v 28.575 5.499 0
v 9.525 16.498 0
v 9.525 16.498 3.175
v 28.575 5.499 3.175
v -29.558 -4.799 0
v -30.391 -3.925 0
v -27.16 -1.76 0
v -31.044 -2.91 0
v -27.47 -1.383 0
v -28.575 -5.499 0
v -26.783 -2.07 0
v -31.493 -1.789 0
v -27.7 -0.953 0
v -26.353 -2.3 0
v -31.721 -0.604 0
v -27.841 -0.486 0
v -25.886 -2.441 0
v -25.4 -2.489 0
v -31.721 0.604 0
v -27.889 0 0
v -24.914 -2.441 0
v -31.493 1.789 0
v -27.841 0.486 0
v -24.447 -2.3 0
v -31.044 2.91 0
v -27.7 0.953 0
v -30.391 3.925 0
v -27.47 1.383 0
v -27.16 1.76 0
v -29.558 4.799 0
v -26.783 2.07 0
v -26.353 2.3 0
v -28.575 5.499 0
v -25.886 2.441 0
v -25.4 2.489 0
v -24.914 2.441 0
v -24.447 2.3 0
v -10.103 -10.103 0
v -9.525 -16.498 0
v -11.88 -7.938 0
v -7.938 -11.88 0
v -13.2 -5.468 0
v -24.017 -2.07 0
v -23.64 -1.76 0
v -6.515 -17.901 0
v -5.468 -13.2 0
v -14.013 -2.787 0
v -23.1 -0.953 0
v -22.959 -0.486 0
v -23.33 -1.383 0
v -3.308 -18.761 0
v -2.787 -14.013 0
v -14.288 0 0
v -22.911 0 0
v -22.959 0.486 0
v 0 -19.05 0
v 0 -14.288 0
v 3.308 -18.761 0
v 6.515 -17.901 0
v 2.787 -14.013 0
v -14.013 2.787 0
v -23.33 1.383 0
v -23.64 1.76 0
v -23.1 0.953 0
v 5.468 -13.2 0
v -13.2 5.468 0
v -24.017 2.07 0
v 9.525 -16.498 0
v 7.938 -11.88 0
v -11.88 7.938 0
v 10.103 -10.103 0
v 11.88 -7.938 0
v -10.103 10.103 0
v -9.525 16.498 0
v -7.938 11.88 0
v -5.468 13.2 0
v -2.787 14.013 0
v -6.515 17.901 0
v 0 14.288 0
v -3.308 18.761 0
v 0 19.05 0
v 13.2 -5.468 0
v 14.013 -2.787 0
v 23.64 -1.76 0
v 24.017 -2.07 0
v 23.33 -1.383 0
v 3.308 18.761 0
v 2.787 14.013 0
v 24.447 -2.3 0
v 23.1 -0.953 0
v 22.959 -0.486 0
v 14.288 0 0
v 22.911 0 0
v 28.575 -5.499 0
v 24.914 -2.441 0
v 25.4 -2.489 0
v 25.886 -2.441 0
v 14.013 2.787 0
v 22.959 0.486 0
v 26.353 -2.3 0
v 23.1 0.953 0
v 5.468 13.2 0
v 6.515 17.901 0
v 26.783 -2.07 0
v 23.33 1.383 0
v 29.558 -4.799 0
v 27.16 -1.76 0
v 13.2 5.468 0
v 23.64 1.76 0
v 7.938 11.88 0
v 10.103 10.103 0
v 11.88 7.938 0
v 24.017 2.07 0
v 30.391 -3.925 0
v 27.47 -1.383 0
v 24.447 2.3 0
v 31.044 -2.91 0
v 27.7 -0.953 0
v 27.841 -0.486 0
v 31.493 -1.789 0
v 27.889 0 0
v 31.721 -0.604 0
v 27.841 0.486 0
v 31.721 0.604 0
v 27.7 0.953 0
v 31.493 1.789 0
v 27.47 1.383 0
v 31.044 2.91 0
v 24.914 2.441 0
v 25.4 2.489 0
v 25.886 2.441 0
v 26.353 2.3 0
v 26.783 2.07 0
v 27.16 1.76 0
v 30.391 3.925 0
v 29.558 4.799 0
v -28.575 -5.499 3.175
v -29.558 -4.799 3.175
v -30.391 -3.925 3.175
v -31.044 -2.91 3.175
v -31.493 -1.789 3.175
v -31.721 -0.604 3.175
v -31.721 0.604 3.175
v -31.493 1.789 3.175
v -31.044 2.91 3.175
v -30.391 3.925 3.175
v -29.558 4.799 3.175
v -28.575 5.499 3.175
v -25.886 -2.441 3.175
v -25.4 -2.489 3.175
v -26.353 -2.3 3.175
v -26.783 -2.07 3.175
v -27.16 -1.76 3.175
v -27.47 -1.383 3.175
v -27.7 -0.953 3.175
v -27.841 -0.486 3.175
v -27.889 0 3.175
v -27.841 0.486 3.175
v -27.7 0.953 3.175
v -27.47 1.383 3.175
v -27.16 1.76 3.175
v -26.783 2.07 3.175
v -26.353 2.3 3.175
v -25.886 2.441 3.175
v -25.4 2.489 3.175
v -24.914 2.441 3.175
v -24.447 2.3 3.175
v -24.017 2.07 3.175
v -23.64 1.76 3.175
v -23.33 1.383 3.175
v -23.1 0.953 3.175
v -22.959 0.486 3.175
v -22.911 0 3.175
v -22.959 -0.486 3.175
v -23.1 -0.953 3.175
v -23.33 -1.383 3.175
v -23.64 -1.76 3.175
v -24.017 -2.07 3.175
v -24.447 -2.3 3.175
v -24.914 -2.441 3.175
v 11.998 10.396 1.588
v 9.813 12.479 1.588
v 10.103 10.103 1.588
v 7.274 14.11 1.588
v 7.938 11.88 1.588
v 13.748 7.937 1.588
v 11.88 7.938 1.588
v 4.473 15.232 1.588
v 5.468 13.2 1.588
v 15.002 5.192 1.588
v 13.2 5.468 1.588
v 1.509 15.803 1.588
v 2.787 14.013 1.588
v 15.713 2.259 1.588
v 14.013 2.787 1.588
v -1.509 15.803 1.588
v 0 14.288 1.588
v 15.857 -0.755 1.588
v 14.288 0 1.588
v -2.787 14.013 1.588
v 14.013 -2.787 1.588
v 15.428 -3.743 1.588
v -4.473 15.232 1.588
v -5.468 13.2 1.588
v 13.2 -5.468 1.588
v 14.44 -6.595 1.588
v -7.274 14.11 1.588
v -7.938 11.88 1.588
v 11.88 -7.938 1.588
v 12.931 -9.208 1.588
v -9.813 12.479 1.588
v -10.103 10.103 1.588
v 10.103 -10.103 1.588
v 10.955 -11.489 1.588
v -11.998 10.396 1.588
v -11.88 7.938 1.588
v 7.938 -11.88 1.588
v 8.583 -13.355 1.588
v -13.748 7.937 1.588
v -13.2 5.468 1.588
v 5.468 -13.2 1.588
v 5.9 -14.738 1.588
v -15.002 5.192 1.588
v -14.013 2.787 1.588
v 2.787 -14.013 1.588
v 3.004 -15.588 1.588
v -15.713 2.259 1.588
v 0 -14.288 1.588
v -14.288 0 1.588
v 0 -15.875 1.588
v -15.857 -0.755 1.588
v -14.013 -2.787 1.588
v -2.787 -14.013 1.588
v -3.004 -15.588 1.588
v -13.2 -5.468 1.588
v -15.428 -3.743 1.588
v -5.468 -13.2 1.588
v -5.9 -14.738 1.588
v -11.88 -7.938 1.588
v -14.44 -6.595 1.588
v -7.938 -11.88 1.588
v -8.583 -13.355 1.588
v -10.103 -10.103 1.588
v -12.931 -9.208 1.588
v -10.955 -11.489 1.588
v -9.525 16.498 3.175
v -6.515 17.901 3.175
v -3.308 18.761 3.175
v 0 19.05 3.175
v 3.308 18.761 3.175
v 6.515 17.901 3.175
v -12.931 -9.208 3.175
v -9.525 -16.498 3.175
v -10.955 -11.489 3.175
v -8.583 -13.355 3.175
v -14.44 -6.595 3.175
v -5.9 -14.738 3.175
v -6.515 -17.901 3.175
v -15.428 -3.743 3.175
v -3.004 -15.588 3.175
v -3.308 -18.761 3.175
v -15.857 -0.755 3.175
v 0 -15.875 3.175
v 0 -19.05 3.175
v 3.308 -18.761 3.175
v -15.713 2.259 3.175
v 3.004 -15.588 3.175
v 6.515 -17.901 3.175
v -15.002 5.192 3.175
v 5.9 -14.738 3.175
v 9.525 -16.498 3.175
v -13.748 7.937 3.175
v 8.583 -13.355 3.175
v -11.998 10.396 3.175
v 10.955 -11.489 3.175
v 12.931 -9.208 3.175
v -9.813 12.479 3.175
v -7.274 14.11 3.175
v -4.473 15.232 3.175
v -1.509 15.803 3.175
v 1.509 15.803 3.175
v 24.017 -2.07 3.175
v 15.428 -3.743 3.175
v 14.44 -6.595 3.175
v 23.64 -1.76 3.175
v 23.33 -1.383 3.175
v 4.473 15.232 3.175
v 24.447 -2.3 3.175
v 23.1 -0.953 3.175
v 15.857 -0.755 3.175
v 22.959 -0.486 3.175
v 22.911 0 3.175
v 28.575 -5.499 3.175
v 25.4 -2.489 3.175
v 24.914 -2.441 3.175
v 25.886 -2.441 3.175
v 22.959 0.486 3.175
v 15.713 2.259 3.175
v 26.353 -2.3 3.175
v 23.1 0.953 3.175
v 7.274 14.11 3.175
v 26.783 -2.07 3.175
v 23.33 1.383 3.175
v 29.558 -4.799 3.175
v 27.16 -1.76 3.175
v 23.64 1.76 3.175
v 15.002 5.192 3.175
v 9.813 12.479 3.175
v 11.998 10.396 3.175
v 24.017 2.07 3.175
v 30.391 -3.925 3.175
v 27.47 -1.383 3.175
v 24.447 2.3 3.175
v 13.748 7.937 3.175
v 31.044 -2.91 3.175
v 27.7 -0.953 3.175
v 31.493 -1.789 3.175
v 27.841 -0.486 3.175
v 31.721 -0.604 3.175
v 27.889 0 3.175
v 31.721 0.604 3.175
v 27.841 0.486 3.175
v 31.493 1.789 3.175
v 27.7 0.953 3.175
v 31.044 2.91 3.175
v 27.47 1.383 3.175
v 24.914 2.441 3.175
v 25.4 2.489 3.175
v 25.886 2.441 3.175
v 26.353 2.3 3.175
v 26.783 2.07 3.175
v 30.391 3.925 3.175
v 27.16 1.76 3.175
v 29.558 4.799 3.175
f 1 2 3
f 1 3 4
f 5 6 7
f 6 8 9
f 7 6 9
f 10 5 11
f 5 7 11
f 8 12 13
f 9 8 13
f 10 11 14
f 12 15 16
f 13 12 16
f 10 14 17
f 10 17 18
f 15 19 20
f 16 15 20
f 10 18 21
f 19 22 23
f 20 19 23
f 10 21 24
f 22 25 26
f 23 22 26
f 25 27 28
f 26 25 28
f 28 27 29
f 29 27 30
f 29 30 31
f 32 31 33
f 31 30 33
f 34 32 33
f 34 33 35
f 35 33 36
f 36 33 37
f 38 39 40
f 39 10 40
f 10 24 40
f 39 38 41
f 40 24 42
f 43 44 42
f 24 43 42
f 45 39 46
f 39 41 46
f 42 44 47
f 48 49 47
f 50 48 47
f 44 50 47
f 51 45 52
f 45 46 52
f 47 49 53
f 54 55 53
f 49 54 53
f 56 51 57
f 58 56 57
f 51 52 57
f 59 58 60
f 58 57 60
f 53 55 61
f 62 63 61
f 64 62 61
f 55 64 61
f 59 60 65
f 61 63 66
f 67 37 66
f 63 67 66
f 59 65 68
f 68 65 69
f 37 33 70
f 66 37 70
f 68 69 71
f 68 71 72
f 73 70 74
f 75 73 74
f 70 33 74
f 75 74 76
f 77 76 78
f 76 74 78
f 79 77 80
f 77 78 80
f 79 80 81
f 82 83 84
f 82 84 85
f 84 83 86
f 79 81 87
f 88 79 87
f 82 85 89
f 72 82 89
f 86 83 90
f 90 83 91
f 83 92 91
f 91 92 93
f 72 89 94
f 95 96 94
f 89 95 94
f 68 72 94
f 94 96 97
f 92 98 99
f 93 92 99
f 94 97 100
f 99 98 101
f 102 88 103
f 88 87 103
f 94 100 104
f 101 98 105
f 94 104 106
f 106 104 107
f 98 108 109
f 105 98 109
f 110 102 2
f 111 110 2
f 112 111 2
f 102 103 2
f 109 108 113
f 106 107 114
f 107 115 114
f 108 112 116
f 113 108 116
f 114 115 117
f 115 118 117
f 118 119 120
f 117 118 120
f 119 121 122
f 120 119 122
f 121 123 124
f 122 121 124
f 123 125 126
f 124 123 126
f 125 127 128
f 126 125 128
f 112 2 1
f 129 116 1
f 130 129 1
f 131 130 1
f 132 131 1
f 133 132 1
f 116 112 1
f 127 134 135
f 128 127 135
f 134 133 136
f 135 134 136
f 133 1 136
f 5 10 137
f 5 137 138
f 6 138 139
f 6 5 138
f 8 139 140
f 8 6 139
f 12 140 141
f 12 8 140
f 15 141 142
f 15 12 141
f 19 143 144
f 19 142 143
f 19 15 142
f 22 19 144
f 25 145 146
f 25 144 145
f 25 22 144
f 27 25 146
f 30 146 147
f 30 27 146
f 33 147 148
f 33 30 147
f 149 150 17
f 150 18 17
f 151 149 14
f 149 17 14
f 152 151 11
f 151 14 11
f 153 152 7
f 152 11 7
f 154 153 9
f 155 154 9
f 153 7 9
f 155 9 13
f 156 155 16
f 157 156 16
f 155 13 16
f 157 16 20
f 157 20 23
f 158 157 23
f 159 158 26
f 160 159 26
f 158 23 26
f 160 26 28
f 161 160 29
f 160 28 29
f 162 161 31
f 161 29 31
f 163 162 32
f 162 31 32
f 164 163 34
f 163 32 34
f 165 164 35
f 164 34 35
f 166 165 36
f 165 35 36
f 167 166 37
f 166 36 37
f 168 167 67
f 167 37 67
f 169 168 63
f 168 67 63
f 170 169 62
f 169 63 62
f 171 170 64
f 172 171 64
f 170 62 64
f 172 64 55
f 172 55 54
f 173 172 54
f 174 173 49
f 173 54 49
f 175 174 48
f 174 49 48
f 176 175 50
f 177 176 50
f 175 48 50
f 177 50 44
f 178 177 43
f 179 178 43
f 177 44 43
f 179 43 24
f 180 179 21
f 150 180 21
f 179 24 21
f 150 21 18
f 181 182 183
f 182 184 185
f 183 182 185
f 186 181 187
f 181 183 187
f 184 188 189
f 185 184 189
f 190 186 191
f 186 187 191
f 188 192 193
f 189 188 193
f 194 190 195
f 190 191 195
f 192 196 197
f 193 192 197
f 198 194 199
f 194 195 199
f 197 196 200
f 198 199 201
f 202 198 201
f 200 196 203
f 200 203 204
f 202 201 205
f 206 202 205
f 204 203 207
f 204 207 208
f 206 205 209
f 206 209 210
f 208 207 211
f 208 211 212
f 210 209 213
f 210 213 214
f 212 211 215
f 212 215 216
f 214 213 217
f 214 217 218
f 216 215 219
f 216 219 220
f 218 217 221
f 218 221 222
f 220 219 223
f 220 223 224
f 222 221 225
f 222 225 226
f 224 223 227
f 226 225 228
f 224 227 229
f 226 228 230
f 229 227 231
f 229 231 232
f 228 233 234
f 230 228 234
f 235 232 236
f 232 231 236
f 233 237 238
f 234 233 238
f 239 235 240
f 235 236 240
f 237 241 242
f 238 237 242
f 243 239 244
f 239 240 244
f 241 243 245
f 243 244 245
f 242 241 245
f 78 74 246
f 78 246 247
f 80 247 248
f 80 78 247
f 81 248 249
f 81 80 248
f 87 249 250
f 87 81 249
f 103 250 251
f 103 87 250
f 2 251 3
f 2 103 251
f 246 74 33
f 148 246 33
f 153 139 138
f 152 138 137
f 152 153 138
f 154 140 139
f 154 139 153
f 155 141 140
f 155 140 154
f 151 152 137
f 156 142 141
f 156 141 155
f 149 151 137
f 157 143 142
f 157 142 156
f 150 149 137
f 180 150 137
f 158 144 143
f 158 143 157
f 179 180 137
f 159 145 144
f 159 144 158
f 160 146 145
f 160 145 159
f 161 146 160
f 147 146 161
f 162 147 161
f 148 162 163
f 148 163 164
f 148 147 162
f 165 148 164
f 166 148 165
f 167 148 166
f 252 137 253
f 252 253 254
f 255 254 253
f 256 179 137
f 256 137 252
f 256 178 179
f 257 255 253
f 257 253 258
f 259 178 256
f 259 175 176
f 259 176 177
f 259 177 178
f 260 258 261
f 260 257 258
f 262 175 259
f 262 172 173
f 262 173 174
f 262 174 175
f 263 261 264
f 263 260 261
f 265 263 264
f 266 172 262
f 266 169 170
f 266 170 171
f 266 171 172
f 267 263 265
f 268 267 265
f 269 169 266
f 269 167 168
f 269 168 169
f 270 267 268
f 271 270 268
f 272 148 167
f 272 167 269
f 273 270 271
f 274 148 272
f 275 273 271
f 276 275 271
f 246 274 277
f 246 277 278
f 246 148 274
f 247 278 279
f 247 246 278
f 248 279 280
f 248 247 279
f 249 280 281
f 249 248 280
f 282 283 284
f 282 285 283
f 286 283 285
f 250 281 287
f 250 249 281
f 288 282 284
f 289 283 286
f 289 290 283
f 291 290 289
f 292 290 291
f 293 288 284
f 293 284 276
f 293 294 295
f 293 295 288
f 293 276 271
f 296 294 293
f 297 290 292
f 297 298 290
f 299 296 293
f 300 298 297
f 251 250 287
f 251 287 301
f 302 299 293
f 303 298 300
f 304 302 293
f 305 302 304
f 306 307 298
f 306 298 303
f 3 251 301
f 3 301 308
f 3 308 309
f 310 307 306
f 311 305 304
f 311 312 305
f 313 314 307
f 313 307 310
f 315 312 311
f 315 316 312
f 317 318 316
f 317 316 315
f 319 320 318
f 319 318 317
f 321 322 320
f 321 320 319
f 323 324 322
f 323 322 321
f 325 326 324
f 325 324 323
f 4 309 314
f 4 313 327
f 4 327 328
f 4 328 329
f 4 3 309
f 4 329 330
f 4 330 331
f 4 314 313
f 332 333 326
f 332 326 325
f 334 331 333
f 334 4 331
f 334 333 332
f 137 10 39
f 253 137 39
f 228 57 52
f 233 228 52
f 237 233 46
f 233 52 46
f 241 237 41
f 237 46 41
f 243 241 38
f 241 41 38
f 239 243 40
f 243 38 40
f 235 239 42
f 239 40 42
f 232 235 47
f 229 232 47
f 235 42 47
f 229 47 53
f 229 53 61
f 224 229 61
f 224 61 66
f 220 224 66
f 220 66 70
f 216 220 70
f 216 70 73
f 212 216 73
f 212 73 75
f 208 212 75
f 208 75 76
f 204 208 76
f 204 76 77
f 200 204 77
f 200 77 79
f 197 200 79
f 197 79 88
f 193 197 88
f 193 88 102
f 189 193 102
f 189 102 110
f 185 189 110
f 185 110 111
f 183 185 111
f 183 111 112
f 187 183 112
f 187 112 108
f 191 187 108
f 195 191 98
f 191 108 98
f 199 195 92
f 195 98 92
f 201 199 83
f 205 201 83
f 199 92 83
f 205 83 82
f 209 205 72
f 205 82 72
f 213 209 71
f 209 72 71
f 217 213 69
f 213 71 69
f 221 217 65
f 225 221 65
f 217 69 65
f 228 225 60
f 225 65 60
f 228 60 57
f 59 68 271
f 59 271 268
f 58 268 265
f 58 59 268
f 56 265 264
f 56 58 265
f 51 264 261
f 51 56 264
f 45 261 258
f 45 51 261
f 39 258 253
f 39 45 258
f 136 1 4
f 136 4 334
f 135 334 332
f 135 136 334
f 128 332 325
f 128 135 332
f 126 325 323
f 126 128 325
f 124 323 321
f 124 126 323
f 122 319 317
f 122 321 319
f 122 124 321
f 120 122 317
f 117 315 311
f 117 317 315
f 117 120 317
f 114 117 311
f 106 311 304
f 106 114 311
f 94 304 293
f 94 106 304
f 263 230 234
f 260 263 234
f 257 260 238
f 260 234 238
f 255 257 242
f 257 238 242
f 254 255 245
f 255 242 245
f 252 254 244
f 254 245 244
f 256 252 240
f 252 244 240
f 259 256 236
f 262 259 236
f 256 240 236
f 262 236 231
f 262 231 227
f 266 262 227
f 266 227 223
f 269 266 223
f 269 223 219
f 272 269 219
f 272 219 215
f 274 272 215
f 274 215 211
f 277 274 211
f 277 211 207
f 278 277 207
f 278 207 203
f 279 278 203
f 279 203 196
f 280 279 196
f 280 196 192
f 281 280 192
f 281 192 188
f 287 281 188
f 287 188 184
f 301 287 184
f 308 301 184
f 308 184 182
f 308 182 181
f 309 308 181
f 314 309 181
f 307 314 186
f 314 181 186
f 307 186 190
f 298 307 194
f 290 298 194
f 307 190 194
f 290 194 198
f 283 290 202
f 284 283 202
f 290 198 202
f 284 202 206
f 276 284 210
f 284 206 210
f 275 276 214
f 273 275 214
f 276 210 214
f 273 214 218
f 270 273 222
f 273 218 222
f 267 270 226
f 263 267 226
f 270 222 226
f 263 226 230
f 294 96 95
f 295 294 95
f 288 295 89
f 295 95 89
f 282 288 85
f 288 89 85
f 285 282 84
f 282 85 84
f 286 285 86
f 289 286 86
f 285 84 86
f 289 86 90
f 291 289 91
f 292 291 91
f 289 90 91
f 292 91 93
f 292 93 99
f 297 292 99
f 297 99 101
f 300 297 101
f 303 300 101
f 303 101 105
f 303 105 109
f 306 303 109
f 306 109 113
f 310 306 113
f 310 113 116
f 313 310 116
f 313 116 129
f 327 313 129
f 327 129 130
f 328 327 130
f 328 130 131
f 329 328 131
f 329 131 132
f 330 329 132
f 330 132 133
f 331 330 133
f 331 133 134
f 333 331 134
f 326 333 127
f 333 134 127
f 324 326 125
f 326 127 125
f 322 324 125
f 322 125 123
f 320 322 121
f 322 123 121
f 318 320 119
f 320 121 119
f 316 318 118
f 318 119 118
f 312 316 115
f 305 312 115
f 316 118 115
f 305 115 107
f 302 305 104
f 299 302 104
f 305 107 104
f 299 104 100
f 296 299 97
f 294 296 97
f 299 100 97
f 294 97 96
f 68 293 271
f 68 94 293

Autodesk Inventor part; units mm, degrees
ref_plane "YZ Plane" through (0, 0, 0) normal (1, 0, 0) x (0, 1, 0)
ref_plane "XZ Plane" through (0, 0, 0) normal (0, 1, 0) x (-1, 0, 0)
ref_plane "XY Plane" through (0, 0, 0) normal (0, 0, 1) x (1, 0, 0)
sketch "Sketch1" plane through (0, 0, 0) normal (0, 0, 1) x (1, 0, 0)
  line L0 (-9.525, 16.4978) -> (-28.575, 5.4993)
  arc A0 (-28.575, 5.4993) -> (-28.575, -5.4993) centre (-25.4, 0) ccw
  line L1 (-28.575, -5.4993) -> (-9.525, -16.4978)
  line L2 (9.525, 16.4978) -> (28.575, 5.4993)
  arc A1 (28.575, -5.4993) -> (28.575, 5.4993) centre (25.4, 0) ccw
  line L3 (28.575, -5.4993) -> (9.525, -16.4978)
  arc A2 (-9.525, -16.4978) -> (9.525, -16.4978) centre (0, 0) ccw
  arc A3 (9.525, 16.4978) -> (-9.525, 16.4978) centre (0, 0) ccw
  line L4 (-44.45, 0) -> (44.45, 0) construction
  line L5 (0, -26.67) -> (0, 26.67) construction
  dimension "d0" = 6.35
  dimension "d1" = 50.8
  dimension "d2" = 19.05
extrude "Extrusion1" add sketch "Sketch1" along normal blind 3.175
sketch "Sketch2" plane through (0, 0, 3.175) normal (0, 0, 1) x (1, 0, 0)
  point P0 (0, 0)
hole "Hole1" at (0, 0, 3.175) direction (0, 0, -1) diameter 28.575 end through all counterbore diameter 31.75 counterbore depth 1.5875
sketch "Sketch3" plane through (0, 0, 3.175) normal (0, 0, 1) x (1, 0, 0)
  arc A0 (-28.575, 5.4993) -> (-28.575, -5.4993) centre (-25.4, 0) ccw construction
  arc A1 (28.575, -5.4993) -> (28.575, 5.4993) centre (25.4, 0) ccw construction
  point P0 (0, 0)
  point P1 (-25.4, 0)
hole "Hole2" at (-25.4, 0, 3.175) at (25.4, 0, 3.175) direction (0, 0, -1) diameter 4.9784 end through all clearance for "Flat Head Machine Screw (82)" size "#10" standard "Ansi Unified Screw Threads"
properties part number "Bearing Holder"
